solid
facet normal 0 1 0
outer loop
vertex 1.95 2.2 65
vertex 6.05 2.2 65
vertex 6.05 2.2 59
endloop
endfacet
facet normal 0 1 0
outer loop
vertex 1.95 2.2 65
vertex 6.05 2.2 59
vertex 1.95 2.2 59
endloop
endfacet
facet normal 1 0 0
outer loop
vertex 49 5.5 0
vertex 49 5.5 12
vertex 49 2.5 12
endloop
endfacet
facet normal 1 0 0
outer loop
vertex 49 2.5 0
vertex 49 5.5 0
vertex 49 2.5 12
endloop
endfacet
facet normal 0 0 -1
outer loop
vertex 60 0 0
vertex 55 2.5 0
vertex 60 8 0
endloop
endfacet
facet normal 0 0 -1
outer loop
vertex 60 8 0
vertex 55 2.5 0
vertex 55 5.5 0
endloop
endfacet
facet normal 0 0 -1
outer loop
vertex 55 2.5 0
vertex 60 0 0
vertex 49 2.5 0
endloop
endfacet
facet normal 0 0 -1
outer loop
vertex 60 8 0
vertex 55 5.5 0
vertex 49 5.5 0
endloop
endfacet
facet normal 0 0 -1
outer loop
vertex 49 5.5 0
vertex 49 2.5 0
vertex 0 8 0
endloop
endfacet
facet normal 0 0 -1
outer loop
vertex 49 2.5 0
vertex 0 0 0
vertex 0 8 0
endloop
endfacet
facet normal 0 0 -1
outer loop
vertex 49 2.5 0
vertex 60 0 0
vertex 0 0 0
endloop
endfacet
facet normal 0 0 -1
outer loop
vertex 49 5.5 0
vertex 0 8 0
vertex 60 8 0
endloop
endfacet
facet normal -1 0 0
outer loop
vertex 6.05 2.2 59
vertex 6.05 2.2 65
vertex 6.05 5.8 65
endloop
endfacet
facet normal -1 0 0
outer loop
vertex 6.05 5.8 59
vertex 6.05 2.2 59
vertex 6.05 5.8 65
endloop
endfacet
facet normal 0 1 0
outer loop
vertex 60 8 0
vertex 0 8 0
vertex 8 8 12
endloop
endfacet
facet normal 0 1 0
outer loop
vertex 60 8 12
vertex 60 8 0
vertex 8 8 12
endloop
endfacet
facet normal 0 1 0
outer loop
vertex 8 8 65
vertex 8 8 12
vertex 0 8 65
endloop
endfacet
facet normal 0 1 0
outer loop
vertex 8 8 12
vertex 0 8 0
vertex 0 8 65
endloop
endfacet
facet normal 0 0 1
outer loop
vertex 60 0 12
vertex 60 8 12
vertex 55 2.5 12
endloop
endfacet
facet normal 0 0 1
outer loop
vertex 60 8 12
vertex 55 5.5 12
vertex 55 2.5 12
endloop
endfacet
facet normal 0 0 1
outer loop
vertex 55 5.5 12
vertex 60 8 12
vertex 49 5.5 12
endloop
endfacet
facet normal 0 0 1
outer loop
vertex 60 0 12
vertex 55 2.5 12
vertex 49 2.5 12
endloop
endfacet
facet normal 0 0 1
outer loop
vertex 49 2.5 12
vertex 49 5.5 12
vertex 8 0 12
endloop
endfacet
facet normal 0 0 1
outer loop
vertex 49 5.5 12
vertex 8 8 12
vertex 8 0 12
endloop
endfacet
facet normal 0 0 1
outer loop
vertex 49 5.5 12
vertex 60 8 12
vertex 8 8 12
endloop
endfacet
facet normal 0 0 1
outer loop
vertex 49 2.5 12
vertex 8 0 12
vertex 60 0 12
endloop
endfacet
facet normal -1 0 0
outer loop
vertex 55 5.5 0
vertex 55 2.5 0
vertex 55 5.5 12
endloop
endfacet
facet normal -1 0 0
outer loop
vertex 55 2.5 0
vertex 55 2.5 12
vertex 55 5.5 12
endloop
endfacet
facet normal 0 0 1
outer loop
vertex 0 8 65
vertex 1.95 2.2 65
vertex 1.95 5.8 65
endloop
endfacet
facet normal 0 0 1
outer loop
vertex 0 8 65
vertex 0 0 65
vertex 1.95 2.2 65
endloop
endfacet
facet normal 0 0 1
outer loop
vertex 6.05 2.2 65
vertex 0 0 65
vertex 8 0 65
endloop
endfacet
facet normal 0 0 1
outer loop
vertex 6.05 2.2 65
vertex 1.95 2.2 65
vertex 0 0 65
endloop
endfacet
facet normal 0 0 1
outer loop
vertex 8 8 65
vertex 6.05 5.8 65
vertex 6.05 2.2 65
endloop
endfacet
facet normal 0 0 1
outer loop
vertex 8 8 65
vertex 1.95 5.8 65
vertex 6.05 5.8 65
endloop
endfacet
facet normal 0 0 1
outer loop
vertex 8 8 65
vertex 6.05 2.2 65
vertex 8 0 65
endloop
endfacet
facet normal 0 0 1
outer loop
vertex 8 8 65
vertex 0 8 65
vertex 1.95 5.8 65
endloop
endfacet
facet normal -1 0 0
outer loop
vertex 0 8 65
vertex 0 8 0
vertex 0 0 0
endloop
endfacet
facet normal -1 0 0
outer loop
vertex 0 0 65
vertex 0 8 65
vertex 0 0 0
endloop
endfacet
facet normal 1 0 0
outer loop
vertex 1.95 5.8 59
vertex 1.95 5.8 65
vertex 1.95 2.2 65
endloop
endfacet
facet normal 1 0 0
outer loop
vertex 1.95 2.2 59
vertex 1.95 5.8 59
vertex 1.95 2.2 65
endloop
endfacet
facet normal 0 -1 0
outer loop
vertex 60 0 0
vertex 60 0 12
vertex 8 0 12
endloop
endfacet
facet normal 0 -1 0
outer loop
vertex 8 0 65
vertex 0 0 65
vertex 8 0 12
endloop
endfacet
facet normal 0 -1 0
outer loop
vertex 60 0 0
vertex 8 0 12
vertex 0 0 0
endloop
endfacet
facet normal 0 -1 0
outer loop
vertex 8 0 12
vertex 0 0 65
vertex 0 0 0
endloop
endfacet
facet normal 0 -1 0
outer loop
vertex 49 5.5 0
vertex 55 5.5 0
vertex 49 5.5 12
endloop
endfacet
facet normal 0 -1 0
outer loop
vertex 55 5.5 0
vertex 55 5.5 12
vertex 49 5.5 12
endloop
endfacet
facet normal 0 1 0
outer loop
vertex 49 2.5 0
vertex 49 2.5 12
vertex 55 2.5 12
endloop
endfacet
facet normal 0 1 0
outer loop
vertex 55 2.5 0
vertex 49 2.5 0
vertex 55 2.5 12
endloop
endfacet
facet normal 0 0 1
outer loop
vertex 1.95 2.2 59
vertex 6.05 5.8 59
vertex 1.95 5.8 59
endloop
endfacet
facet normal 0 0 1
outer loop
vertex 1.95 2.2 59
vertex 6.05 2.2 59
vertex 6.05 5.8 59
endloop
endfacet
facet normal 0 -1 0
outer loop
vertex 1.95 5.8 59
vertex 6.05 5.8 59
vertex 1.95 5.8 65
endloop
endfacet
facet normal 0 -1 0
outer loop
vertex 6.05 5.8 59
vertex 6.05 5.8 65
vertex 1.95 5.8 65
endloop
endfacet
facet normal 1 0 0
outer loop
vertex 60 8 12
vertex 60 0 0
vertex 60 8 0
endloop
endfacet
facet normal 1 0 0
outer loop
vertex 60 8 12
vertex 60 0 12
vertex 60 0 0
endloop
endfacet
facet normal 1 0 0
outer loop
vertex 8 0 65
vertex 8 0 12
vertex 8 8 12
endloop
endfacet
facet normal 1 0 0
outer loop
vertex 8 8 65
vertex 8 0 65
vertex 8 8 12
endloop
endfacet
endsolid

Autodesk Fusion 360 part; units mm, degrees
sketch "Esquisse1" plane through (0, 0, 0) normal (0, 0, 1) x (1, 0, 0)
  line L0 (0, 0) -> (8, 0)
  line L1 (8, 0) -> (8, 8)
  line L2 (8, 8) -> (0, 8)
  line L3 (0, 8) -> (0, 0)
  dimension "d1" = 8
  dimension "d2" = 8
extrude "Extrusion1" add sketch "Esquisse1" along normal blind 65
sketch "Esquisse8" plane through (0, 0, 65) normal (0, 0, 1) x (-1, 0, 0)
  line L0 (0, -8) -> (0, 0)
  line L1 (0, 0) -> (-8, 0)
  line L2 (-8, 0) -> (-8, -8)
  line L3 (-8, -8) -> (0, -8)
  line L4 (0, -4) -> (-8, -4)
  line L5 (-1.95, -4) -> (-6.05, -4)
  line L6 (-6.05, -4) -> (-6.05, -5.8)
  line L7 (-6.05, -5.8) -> (-1.95, -5.8)
  line L8 (-1.95, -5.8) -> (-1.95, -4)
  line L9 (-4, -8) -> (-4, 0)
  line L10 (-1.95, -2.2) -> (-1.95, -4)
  line L11 (-6.05, -2.2) -> (-1.95, -2.2)
  line L12 (-6.05, -4) -> (-6.05, -2.2)
  dimension "d41" = 4.1
  dimension "d42" = 2.05
  dimension "d43" = 1.8
extrude "Extrusion8" cut sketch "Esquisse8" against normal blind 6 contours L4 L5 L7 L8 L9 | L4 L5 L9 L10 L11 | L4 L5 L6 L7 L9 | L4 L5 L9 L11 L12
sketch "Esquisse9" plane through (8, 0, 0) normal (1, 0, 0) x (0, 1, 0)
  line L0 (0, 0) -> (8, 0)
  line L1 (8, 0) -> (8, 65)
  line L2 (8, 65) -> (0, 65)
  line L3 (0, 65) -> (0, 0)
  line L4 (0, 0) -> (8, 0)
  line L5 (8, 0) -> (8, 12)
  line L6 (8, 12) -> (0, 12)
  line L7 (0, 12) -> (0, 0)
  dimension "d46" = 12
extrude "Extrusion9" add sketch "Esquisse9" along normal blind 52 contours L0 L1 L3 L4 L5 L6 L7
sketch "Esquisse10" plane through (0, 0, 12) normal (0, 0, 1) x (-1, 0, 0)
  line L0 (-8, -8) -> (-8, 0)
  line L1 (-8, 0) -> (-60, 0)
  line L2 (-60, 0) -> (-60, -8)
  line L3 (-60, -8) -> (-8, -8)
  line L4 (-55, -5.5) -> (-49, -5.5)
  line L5 (-49, -5.5) -> (-49, -2.5)
  line L6 (-49, -2.5) -> (-55, -2.5)
  line L7 (-55, -2.5) -> (-55, -5.5)
  dimension "d49" = 2.5
  dimension "d50" = 2.5
  dimension "d51" = 5
  dimension "d52" = 6
extrude "Extrusion10" cut sketch "Esquisse10" against normal blind 23 contours L4 L5 L6 L7
